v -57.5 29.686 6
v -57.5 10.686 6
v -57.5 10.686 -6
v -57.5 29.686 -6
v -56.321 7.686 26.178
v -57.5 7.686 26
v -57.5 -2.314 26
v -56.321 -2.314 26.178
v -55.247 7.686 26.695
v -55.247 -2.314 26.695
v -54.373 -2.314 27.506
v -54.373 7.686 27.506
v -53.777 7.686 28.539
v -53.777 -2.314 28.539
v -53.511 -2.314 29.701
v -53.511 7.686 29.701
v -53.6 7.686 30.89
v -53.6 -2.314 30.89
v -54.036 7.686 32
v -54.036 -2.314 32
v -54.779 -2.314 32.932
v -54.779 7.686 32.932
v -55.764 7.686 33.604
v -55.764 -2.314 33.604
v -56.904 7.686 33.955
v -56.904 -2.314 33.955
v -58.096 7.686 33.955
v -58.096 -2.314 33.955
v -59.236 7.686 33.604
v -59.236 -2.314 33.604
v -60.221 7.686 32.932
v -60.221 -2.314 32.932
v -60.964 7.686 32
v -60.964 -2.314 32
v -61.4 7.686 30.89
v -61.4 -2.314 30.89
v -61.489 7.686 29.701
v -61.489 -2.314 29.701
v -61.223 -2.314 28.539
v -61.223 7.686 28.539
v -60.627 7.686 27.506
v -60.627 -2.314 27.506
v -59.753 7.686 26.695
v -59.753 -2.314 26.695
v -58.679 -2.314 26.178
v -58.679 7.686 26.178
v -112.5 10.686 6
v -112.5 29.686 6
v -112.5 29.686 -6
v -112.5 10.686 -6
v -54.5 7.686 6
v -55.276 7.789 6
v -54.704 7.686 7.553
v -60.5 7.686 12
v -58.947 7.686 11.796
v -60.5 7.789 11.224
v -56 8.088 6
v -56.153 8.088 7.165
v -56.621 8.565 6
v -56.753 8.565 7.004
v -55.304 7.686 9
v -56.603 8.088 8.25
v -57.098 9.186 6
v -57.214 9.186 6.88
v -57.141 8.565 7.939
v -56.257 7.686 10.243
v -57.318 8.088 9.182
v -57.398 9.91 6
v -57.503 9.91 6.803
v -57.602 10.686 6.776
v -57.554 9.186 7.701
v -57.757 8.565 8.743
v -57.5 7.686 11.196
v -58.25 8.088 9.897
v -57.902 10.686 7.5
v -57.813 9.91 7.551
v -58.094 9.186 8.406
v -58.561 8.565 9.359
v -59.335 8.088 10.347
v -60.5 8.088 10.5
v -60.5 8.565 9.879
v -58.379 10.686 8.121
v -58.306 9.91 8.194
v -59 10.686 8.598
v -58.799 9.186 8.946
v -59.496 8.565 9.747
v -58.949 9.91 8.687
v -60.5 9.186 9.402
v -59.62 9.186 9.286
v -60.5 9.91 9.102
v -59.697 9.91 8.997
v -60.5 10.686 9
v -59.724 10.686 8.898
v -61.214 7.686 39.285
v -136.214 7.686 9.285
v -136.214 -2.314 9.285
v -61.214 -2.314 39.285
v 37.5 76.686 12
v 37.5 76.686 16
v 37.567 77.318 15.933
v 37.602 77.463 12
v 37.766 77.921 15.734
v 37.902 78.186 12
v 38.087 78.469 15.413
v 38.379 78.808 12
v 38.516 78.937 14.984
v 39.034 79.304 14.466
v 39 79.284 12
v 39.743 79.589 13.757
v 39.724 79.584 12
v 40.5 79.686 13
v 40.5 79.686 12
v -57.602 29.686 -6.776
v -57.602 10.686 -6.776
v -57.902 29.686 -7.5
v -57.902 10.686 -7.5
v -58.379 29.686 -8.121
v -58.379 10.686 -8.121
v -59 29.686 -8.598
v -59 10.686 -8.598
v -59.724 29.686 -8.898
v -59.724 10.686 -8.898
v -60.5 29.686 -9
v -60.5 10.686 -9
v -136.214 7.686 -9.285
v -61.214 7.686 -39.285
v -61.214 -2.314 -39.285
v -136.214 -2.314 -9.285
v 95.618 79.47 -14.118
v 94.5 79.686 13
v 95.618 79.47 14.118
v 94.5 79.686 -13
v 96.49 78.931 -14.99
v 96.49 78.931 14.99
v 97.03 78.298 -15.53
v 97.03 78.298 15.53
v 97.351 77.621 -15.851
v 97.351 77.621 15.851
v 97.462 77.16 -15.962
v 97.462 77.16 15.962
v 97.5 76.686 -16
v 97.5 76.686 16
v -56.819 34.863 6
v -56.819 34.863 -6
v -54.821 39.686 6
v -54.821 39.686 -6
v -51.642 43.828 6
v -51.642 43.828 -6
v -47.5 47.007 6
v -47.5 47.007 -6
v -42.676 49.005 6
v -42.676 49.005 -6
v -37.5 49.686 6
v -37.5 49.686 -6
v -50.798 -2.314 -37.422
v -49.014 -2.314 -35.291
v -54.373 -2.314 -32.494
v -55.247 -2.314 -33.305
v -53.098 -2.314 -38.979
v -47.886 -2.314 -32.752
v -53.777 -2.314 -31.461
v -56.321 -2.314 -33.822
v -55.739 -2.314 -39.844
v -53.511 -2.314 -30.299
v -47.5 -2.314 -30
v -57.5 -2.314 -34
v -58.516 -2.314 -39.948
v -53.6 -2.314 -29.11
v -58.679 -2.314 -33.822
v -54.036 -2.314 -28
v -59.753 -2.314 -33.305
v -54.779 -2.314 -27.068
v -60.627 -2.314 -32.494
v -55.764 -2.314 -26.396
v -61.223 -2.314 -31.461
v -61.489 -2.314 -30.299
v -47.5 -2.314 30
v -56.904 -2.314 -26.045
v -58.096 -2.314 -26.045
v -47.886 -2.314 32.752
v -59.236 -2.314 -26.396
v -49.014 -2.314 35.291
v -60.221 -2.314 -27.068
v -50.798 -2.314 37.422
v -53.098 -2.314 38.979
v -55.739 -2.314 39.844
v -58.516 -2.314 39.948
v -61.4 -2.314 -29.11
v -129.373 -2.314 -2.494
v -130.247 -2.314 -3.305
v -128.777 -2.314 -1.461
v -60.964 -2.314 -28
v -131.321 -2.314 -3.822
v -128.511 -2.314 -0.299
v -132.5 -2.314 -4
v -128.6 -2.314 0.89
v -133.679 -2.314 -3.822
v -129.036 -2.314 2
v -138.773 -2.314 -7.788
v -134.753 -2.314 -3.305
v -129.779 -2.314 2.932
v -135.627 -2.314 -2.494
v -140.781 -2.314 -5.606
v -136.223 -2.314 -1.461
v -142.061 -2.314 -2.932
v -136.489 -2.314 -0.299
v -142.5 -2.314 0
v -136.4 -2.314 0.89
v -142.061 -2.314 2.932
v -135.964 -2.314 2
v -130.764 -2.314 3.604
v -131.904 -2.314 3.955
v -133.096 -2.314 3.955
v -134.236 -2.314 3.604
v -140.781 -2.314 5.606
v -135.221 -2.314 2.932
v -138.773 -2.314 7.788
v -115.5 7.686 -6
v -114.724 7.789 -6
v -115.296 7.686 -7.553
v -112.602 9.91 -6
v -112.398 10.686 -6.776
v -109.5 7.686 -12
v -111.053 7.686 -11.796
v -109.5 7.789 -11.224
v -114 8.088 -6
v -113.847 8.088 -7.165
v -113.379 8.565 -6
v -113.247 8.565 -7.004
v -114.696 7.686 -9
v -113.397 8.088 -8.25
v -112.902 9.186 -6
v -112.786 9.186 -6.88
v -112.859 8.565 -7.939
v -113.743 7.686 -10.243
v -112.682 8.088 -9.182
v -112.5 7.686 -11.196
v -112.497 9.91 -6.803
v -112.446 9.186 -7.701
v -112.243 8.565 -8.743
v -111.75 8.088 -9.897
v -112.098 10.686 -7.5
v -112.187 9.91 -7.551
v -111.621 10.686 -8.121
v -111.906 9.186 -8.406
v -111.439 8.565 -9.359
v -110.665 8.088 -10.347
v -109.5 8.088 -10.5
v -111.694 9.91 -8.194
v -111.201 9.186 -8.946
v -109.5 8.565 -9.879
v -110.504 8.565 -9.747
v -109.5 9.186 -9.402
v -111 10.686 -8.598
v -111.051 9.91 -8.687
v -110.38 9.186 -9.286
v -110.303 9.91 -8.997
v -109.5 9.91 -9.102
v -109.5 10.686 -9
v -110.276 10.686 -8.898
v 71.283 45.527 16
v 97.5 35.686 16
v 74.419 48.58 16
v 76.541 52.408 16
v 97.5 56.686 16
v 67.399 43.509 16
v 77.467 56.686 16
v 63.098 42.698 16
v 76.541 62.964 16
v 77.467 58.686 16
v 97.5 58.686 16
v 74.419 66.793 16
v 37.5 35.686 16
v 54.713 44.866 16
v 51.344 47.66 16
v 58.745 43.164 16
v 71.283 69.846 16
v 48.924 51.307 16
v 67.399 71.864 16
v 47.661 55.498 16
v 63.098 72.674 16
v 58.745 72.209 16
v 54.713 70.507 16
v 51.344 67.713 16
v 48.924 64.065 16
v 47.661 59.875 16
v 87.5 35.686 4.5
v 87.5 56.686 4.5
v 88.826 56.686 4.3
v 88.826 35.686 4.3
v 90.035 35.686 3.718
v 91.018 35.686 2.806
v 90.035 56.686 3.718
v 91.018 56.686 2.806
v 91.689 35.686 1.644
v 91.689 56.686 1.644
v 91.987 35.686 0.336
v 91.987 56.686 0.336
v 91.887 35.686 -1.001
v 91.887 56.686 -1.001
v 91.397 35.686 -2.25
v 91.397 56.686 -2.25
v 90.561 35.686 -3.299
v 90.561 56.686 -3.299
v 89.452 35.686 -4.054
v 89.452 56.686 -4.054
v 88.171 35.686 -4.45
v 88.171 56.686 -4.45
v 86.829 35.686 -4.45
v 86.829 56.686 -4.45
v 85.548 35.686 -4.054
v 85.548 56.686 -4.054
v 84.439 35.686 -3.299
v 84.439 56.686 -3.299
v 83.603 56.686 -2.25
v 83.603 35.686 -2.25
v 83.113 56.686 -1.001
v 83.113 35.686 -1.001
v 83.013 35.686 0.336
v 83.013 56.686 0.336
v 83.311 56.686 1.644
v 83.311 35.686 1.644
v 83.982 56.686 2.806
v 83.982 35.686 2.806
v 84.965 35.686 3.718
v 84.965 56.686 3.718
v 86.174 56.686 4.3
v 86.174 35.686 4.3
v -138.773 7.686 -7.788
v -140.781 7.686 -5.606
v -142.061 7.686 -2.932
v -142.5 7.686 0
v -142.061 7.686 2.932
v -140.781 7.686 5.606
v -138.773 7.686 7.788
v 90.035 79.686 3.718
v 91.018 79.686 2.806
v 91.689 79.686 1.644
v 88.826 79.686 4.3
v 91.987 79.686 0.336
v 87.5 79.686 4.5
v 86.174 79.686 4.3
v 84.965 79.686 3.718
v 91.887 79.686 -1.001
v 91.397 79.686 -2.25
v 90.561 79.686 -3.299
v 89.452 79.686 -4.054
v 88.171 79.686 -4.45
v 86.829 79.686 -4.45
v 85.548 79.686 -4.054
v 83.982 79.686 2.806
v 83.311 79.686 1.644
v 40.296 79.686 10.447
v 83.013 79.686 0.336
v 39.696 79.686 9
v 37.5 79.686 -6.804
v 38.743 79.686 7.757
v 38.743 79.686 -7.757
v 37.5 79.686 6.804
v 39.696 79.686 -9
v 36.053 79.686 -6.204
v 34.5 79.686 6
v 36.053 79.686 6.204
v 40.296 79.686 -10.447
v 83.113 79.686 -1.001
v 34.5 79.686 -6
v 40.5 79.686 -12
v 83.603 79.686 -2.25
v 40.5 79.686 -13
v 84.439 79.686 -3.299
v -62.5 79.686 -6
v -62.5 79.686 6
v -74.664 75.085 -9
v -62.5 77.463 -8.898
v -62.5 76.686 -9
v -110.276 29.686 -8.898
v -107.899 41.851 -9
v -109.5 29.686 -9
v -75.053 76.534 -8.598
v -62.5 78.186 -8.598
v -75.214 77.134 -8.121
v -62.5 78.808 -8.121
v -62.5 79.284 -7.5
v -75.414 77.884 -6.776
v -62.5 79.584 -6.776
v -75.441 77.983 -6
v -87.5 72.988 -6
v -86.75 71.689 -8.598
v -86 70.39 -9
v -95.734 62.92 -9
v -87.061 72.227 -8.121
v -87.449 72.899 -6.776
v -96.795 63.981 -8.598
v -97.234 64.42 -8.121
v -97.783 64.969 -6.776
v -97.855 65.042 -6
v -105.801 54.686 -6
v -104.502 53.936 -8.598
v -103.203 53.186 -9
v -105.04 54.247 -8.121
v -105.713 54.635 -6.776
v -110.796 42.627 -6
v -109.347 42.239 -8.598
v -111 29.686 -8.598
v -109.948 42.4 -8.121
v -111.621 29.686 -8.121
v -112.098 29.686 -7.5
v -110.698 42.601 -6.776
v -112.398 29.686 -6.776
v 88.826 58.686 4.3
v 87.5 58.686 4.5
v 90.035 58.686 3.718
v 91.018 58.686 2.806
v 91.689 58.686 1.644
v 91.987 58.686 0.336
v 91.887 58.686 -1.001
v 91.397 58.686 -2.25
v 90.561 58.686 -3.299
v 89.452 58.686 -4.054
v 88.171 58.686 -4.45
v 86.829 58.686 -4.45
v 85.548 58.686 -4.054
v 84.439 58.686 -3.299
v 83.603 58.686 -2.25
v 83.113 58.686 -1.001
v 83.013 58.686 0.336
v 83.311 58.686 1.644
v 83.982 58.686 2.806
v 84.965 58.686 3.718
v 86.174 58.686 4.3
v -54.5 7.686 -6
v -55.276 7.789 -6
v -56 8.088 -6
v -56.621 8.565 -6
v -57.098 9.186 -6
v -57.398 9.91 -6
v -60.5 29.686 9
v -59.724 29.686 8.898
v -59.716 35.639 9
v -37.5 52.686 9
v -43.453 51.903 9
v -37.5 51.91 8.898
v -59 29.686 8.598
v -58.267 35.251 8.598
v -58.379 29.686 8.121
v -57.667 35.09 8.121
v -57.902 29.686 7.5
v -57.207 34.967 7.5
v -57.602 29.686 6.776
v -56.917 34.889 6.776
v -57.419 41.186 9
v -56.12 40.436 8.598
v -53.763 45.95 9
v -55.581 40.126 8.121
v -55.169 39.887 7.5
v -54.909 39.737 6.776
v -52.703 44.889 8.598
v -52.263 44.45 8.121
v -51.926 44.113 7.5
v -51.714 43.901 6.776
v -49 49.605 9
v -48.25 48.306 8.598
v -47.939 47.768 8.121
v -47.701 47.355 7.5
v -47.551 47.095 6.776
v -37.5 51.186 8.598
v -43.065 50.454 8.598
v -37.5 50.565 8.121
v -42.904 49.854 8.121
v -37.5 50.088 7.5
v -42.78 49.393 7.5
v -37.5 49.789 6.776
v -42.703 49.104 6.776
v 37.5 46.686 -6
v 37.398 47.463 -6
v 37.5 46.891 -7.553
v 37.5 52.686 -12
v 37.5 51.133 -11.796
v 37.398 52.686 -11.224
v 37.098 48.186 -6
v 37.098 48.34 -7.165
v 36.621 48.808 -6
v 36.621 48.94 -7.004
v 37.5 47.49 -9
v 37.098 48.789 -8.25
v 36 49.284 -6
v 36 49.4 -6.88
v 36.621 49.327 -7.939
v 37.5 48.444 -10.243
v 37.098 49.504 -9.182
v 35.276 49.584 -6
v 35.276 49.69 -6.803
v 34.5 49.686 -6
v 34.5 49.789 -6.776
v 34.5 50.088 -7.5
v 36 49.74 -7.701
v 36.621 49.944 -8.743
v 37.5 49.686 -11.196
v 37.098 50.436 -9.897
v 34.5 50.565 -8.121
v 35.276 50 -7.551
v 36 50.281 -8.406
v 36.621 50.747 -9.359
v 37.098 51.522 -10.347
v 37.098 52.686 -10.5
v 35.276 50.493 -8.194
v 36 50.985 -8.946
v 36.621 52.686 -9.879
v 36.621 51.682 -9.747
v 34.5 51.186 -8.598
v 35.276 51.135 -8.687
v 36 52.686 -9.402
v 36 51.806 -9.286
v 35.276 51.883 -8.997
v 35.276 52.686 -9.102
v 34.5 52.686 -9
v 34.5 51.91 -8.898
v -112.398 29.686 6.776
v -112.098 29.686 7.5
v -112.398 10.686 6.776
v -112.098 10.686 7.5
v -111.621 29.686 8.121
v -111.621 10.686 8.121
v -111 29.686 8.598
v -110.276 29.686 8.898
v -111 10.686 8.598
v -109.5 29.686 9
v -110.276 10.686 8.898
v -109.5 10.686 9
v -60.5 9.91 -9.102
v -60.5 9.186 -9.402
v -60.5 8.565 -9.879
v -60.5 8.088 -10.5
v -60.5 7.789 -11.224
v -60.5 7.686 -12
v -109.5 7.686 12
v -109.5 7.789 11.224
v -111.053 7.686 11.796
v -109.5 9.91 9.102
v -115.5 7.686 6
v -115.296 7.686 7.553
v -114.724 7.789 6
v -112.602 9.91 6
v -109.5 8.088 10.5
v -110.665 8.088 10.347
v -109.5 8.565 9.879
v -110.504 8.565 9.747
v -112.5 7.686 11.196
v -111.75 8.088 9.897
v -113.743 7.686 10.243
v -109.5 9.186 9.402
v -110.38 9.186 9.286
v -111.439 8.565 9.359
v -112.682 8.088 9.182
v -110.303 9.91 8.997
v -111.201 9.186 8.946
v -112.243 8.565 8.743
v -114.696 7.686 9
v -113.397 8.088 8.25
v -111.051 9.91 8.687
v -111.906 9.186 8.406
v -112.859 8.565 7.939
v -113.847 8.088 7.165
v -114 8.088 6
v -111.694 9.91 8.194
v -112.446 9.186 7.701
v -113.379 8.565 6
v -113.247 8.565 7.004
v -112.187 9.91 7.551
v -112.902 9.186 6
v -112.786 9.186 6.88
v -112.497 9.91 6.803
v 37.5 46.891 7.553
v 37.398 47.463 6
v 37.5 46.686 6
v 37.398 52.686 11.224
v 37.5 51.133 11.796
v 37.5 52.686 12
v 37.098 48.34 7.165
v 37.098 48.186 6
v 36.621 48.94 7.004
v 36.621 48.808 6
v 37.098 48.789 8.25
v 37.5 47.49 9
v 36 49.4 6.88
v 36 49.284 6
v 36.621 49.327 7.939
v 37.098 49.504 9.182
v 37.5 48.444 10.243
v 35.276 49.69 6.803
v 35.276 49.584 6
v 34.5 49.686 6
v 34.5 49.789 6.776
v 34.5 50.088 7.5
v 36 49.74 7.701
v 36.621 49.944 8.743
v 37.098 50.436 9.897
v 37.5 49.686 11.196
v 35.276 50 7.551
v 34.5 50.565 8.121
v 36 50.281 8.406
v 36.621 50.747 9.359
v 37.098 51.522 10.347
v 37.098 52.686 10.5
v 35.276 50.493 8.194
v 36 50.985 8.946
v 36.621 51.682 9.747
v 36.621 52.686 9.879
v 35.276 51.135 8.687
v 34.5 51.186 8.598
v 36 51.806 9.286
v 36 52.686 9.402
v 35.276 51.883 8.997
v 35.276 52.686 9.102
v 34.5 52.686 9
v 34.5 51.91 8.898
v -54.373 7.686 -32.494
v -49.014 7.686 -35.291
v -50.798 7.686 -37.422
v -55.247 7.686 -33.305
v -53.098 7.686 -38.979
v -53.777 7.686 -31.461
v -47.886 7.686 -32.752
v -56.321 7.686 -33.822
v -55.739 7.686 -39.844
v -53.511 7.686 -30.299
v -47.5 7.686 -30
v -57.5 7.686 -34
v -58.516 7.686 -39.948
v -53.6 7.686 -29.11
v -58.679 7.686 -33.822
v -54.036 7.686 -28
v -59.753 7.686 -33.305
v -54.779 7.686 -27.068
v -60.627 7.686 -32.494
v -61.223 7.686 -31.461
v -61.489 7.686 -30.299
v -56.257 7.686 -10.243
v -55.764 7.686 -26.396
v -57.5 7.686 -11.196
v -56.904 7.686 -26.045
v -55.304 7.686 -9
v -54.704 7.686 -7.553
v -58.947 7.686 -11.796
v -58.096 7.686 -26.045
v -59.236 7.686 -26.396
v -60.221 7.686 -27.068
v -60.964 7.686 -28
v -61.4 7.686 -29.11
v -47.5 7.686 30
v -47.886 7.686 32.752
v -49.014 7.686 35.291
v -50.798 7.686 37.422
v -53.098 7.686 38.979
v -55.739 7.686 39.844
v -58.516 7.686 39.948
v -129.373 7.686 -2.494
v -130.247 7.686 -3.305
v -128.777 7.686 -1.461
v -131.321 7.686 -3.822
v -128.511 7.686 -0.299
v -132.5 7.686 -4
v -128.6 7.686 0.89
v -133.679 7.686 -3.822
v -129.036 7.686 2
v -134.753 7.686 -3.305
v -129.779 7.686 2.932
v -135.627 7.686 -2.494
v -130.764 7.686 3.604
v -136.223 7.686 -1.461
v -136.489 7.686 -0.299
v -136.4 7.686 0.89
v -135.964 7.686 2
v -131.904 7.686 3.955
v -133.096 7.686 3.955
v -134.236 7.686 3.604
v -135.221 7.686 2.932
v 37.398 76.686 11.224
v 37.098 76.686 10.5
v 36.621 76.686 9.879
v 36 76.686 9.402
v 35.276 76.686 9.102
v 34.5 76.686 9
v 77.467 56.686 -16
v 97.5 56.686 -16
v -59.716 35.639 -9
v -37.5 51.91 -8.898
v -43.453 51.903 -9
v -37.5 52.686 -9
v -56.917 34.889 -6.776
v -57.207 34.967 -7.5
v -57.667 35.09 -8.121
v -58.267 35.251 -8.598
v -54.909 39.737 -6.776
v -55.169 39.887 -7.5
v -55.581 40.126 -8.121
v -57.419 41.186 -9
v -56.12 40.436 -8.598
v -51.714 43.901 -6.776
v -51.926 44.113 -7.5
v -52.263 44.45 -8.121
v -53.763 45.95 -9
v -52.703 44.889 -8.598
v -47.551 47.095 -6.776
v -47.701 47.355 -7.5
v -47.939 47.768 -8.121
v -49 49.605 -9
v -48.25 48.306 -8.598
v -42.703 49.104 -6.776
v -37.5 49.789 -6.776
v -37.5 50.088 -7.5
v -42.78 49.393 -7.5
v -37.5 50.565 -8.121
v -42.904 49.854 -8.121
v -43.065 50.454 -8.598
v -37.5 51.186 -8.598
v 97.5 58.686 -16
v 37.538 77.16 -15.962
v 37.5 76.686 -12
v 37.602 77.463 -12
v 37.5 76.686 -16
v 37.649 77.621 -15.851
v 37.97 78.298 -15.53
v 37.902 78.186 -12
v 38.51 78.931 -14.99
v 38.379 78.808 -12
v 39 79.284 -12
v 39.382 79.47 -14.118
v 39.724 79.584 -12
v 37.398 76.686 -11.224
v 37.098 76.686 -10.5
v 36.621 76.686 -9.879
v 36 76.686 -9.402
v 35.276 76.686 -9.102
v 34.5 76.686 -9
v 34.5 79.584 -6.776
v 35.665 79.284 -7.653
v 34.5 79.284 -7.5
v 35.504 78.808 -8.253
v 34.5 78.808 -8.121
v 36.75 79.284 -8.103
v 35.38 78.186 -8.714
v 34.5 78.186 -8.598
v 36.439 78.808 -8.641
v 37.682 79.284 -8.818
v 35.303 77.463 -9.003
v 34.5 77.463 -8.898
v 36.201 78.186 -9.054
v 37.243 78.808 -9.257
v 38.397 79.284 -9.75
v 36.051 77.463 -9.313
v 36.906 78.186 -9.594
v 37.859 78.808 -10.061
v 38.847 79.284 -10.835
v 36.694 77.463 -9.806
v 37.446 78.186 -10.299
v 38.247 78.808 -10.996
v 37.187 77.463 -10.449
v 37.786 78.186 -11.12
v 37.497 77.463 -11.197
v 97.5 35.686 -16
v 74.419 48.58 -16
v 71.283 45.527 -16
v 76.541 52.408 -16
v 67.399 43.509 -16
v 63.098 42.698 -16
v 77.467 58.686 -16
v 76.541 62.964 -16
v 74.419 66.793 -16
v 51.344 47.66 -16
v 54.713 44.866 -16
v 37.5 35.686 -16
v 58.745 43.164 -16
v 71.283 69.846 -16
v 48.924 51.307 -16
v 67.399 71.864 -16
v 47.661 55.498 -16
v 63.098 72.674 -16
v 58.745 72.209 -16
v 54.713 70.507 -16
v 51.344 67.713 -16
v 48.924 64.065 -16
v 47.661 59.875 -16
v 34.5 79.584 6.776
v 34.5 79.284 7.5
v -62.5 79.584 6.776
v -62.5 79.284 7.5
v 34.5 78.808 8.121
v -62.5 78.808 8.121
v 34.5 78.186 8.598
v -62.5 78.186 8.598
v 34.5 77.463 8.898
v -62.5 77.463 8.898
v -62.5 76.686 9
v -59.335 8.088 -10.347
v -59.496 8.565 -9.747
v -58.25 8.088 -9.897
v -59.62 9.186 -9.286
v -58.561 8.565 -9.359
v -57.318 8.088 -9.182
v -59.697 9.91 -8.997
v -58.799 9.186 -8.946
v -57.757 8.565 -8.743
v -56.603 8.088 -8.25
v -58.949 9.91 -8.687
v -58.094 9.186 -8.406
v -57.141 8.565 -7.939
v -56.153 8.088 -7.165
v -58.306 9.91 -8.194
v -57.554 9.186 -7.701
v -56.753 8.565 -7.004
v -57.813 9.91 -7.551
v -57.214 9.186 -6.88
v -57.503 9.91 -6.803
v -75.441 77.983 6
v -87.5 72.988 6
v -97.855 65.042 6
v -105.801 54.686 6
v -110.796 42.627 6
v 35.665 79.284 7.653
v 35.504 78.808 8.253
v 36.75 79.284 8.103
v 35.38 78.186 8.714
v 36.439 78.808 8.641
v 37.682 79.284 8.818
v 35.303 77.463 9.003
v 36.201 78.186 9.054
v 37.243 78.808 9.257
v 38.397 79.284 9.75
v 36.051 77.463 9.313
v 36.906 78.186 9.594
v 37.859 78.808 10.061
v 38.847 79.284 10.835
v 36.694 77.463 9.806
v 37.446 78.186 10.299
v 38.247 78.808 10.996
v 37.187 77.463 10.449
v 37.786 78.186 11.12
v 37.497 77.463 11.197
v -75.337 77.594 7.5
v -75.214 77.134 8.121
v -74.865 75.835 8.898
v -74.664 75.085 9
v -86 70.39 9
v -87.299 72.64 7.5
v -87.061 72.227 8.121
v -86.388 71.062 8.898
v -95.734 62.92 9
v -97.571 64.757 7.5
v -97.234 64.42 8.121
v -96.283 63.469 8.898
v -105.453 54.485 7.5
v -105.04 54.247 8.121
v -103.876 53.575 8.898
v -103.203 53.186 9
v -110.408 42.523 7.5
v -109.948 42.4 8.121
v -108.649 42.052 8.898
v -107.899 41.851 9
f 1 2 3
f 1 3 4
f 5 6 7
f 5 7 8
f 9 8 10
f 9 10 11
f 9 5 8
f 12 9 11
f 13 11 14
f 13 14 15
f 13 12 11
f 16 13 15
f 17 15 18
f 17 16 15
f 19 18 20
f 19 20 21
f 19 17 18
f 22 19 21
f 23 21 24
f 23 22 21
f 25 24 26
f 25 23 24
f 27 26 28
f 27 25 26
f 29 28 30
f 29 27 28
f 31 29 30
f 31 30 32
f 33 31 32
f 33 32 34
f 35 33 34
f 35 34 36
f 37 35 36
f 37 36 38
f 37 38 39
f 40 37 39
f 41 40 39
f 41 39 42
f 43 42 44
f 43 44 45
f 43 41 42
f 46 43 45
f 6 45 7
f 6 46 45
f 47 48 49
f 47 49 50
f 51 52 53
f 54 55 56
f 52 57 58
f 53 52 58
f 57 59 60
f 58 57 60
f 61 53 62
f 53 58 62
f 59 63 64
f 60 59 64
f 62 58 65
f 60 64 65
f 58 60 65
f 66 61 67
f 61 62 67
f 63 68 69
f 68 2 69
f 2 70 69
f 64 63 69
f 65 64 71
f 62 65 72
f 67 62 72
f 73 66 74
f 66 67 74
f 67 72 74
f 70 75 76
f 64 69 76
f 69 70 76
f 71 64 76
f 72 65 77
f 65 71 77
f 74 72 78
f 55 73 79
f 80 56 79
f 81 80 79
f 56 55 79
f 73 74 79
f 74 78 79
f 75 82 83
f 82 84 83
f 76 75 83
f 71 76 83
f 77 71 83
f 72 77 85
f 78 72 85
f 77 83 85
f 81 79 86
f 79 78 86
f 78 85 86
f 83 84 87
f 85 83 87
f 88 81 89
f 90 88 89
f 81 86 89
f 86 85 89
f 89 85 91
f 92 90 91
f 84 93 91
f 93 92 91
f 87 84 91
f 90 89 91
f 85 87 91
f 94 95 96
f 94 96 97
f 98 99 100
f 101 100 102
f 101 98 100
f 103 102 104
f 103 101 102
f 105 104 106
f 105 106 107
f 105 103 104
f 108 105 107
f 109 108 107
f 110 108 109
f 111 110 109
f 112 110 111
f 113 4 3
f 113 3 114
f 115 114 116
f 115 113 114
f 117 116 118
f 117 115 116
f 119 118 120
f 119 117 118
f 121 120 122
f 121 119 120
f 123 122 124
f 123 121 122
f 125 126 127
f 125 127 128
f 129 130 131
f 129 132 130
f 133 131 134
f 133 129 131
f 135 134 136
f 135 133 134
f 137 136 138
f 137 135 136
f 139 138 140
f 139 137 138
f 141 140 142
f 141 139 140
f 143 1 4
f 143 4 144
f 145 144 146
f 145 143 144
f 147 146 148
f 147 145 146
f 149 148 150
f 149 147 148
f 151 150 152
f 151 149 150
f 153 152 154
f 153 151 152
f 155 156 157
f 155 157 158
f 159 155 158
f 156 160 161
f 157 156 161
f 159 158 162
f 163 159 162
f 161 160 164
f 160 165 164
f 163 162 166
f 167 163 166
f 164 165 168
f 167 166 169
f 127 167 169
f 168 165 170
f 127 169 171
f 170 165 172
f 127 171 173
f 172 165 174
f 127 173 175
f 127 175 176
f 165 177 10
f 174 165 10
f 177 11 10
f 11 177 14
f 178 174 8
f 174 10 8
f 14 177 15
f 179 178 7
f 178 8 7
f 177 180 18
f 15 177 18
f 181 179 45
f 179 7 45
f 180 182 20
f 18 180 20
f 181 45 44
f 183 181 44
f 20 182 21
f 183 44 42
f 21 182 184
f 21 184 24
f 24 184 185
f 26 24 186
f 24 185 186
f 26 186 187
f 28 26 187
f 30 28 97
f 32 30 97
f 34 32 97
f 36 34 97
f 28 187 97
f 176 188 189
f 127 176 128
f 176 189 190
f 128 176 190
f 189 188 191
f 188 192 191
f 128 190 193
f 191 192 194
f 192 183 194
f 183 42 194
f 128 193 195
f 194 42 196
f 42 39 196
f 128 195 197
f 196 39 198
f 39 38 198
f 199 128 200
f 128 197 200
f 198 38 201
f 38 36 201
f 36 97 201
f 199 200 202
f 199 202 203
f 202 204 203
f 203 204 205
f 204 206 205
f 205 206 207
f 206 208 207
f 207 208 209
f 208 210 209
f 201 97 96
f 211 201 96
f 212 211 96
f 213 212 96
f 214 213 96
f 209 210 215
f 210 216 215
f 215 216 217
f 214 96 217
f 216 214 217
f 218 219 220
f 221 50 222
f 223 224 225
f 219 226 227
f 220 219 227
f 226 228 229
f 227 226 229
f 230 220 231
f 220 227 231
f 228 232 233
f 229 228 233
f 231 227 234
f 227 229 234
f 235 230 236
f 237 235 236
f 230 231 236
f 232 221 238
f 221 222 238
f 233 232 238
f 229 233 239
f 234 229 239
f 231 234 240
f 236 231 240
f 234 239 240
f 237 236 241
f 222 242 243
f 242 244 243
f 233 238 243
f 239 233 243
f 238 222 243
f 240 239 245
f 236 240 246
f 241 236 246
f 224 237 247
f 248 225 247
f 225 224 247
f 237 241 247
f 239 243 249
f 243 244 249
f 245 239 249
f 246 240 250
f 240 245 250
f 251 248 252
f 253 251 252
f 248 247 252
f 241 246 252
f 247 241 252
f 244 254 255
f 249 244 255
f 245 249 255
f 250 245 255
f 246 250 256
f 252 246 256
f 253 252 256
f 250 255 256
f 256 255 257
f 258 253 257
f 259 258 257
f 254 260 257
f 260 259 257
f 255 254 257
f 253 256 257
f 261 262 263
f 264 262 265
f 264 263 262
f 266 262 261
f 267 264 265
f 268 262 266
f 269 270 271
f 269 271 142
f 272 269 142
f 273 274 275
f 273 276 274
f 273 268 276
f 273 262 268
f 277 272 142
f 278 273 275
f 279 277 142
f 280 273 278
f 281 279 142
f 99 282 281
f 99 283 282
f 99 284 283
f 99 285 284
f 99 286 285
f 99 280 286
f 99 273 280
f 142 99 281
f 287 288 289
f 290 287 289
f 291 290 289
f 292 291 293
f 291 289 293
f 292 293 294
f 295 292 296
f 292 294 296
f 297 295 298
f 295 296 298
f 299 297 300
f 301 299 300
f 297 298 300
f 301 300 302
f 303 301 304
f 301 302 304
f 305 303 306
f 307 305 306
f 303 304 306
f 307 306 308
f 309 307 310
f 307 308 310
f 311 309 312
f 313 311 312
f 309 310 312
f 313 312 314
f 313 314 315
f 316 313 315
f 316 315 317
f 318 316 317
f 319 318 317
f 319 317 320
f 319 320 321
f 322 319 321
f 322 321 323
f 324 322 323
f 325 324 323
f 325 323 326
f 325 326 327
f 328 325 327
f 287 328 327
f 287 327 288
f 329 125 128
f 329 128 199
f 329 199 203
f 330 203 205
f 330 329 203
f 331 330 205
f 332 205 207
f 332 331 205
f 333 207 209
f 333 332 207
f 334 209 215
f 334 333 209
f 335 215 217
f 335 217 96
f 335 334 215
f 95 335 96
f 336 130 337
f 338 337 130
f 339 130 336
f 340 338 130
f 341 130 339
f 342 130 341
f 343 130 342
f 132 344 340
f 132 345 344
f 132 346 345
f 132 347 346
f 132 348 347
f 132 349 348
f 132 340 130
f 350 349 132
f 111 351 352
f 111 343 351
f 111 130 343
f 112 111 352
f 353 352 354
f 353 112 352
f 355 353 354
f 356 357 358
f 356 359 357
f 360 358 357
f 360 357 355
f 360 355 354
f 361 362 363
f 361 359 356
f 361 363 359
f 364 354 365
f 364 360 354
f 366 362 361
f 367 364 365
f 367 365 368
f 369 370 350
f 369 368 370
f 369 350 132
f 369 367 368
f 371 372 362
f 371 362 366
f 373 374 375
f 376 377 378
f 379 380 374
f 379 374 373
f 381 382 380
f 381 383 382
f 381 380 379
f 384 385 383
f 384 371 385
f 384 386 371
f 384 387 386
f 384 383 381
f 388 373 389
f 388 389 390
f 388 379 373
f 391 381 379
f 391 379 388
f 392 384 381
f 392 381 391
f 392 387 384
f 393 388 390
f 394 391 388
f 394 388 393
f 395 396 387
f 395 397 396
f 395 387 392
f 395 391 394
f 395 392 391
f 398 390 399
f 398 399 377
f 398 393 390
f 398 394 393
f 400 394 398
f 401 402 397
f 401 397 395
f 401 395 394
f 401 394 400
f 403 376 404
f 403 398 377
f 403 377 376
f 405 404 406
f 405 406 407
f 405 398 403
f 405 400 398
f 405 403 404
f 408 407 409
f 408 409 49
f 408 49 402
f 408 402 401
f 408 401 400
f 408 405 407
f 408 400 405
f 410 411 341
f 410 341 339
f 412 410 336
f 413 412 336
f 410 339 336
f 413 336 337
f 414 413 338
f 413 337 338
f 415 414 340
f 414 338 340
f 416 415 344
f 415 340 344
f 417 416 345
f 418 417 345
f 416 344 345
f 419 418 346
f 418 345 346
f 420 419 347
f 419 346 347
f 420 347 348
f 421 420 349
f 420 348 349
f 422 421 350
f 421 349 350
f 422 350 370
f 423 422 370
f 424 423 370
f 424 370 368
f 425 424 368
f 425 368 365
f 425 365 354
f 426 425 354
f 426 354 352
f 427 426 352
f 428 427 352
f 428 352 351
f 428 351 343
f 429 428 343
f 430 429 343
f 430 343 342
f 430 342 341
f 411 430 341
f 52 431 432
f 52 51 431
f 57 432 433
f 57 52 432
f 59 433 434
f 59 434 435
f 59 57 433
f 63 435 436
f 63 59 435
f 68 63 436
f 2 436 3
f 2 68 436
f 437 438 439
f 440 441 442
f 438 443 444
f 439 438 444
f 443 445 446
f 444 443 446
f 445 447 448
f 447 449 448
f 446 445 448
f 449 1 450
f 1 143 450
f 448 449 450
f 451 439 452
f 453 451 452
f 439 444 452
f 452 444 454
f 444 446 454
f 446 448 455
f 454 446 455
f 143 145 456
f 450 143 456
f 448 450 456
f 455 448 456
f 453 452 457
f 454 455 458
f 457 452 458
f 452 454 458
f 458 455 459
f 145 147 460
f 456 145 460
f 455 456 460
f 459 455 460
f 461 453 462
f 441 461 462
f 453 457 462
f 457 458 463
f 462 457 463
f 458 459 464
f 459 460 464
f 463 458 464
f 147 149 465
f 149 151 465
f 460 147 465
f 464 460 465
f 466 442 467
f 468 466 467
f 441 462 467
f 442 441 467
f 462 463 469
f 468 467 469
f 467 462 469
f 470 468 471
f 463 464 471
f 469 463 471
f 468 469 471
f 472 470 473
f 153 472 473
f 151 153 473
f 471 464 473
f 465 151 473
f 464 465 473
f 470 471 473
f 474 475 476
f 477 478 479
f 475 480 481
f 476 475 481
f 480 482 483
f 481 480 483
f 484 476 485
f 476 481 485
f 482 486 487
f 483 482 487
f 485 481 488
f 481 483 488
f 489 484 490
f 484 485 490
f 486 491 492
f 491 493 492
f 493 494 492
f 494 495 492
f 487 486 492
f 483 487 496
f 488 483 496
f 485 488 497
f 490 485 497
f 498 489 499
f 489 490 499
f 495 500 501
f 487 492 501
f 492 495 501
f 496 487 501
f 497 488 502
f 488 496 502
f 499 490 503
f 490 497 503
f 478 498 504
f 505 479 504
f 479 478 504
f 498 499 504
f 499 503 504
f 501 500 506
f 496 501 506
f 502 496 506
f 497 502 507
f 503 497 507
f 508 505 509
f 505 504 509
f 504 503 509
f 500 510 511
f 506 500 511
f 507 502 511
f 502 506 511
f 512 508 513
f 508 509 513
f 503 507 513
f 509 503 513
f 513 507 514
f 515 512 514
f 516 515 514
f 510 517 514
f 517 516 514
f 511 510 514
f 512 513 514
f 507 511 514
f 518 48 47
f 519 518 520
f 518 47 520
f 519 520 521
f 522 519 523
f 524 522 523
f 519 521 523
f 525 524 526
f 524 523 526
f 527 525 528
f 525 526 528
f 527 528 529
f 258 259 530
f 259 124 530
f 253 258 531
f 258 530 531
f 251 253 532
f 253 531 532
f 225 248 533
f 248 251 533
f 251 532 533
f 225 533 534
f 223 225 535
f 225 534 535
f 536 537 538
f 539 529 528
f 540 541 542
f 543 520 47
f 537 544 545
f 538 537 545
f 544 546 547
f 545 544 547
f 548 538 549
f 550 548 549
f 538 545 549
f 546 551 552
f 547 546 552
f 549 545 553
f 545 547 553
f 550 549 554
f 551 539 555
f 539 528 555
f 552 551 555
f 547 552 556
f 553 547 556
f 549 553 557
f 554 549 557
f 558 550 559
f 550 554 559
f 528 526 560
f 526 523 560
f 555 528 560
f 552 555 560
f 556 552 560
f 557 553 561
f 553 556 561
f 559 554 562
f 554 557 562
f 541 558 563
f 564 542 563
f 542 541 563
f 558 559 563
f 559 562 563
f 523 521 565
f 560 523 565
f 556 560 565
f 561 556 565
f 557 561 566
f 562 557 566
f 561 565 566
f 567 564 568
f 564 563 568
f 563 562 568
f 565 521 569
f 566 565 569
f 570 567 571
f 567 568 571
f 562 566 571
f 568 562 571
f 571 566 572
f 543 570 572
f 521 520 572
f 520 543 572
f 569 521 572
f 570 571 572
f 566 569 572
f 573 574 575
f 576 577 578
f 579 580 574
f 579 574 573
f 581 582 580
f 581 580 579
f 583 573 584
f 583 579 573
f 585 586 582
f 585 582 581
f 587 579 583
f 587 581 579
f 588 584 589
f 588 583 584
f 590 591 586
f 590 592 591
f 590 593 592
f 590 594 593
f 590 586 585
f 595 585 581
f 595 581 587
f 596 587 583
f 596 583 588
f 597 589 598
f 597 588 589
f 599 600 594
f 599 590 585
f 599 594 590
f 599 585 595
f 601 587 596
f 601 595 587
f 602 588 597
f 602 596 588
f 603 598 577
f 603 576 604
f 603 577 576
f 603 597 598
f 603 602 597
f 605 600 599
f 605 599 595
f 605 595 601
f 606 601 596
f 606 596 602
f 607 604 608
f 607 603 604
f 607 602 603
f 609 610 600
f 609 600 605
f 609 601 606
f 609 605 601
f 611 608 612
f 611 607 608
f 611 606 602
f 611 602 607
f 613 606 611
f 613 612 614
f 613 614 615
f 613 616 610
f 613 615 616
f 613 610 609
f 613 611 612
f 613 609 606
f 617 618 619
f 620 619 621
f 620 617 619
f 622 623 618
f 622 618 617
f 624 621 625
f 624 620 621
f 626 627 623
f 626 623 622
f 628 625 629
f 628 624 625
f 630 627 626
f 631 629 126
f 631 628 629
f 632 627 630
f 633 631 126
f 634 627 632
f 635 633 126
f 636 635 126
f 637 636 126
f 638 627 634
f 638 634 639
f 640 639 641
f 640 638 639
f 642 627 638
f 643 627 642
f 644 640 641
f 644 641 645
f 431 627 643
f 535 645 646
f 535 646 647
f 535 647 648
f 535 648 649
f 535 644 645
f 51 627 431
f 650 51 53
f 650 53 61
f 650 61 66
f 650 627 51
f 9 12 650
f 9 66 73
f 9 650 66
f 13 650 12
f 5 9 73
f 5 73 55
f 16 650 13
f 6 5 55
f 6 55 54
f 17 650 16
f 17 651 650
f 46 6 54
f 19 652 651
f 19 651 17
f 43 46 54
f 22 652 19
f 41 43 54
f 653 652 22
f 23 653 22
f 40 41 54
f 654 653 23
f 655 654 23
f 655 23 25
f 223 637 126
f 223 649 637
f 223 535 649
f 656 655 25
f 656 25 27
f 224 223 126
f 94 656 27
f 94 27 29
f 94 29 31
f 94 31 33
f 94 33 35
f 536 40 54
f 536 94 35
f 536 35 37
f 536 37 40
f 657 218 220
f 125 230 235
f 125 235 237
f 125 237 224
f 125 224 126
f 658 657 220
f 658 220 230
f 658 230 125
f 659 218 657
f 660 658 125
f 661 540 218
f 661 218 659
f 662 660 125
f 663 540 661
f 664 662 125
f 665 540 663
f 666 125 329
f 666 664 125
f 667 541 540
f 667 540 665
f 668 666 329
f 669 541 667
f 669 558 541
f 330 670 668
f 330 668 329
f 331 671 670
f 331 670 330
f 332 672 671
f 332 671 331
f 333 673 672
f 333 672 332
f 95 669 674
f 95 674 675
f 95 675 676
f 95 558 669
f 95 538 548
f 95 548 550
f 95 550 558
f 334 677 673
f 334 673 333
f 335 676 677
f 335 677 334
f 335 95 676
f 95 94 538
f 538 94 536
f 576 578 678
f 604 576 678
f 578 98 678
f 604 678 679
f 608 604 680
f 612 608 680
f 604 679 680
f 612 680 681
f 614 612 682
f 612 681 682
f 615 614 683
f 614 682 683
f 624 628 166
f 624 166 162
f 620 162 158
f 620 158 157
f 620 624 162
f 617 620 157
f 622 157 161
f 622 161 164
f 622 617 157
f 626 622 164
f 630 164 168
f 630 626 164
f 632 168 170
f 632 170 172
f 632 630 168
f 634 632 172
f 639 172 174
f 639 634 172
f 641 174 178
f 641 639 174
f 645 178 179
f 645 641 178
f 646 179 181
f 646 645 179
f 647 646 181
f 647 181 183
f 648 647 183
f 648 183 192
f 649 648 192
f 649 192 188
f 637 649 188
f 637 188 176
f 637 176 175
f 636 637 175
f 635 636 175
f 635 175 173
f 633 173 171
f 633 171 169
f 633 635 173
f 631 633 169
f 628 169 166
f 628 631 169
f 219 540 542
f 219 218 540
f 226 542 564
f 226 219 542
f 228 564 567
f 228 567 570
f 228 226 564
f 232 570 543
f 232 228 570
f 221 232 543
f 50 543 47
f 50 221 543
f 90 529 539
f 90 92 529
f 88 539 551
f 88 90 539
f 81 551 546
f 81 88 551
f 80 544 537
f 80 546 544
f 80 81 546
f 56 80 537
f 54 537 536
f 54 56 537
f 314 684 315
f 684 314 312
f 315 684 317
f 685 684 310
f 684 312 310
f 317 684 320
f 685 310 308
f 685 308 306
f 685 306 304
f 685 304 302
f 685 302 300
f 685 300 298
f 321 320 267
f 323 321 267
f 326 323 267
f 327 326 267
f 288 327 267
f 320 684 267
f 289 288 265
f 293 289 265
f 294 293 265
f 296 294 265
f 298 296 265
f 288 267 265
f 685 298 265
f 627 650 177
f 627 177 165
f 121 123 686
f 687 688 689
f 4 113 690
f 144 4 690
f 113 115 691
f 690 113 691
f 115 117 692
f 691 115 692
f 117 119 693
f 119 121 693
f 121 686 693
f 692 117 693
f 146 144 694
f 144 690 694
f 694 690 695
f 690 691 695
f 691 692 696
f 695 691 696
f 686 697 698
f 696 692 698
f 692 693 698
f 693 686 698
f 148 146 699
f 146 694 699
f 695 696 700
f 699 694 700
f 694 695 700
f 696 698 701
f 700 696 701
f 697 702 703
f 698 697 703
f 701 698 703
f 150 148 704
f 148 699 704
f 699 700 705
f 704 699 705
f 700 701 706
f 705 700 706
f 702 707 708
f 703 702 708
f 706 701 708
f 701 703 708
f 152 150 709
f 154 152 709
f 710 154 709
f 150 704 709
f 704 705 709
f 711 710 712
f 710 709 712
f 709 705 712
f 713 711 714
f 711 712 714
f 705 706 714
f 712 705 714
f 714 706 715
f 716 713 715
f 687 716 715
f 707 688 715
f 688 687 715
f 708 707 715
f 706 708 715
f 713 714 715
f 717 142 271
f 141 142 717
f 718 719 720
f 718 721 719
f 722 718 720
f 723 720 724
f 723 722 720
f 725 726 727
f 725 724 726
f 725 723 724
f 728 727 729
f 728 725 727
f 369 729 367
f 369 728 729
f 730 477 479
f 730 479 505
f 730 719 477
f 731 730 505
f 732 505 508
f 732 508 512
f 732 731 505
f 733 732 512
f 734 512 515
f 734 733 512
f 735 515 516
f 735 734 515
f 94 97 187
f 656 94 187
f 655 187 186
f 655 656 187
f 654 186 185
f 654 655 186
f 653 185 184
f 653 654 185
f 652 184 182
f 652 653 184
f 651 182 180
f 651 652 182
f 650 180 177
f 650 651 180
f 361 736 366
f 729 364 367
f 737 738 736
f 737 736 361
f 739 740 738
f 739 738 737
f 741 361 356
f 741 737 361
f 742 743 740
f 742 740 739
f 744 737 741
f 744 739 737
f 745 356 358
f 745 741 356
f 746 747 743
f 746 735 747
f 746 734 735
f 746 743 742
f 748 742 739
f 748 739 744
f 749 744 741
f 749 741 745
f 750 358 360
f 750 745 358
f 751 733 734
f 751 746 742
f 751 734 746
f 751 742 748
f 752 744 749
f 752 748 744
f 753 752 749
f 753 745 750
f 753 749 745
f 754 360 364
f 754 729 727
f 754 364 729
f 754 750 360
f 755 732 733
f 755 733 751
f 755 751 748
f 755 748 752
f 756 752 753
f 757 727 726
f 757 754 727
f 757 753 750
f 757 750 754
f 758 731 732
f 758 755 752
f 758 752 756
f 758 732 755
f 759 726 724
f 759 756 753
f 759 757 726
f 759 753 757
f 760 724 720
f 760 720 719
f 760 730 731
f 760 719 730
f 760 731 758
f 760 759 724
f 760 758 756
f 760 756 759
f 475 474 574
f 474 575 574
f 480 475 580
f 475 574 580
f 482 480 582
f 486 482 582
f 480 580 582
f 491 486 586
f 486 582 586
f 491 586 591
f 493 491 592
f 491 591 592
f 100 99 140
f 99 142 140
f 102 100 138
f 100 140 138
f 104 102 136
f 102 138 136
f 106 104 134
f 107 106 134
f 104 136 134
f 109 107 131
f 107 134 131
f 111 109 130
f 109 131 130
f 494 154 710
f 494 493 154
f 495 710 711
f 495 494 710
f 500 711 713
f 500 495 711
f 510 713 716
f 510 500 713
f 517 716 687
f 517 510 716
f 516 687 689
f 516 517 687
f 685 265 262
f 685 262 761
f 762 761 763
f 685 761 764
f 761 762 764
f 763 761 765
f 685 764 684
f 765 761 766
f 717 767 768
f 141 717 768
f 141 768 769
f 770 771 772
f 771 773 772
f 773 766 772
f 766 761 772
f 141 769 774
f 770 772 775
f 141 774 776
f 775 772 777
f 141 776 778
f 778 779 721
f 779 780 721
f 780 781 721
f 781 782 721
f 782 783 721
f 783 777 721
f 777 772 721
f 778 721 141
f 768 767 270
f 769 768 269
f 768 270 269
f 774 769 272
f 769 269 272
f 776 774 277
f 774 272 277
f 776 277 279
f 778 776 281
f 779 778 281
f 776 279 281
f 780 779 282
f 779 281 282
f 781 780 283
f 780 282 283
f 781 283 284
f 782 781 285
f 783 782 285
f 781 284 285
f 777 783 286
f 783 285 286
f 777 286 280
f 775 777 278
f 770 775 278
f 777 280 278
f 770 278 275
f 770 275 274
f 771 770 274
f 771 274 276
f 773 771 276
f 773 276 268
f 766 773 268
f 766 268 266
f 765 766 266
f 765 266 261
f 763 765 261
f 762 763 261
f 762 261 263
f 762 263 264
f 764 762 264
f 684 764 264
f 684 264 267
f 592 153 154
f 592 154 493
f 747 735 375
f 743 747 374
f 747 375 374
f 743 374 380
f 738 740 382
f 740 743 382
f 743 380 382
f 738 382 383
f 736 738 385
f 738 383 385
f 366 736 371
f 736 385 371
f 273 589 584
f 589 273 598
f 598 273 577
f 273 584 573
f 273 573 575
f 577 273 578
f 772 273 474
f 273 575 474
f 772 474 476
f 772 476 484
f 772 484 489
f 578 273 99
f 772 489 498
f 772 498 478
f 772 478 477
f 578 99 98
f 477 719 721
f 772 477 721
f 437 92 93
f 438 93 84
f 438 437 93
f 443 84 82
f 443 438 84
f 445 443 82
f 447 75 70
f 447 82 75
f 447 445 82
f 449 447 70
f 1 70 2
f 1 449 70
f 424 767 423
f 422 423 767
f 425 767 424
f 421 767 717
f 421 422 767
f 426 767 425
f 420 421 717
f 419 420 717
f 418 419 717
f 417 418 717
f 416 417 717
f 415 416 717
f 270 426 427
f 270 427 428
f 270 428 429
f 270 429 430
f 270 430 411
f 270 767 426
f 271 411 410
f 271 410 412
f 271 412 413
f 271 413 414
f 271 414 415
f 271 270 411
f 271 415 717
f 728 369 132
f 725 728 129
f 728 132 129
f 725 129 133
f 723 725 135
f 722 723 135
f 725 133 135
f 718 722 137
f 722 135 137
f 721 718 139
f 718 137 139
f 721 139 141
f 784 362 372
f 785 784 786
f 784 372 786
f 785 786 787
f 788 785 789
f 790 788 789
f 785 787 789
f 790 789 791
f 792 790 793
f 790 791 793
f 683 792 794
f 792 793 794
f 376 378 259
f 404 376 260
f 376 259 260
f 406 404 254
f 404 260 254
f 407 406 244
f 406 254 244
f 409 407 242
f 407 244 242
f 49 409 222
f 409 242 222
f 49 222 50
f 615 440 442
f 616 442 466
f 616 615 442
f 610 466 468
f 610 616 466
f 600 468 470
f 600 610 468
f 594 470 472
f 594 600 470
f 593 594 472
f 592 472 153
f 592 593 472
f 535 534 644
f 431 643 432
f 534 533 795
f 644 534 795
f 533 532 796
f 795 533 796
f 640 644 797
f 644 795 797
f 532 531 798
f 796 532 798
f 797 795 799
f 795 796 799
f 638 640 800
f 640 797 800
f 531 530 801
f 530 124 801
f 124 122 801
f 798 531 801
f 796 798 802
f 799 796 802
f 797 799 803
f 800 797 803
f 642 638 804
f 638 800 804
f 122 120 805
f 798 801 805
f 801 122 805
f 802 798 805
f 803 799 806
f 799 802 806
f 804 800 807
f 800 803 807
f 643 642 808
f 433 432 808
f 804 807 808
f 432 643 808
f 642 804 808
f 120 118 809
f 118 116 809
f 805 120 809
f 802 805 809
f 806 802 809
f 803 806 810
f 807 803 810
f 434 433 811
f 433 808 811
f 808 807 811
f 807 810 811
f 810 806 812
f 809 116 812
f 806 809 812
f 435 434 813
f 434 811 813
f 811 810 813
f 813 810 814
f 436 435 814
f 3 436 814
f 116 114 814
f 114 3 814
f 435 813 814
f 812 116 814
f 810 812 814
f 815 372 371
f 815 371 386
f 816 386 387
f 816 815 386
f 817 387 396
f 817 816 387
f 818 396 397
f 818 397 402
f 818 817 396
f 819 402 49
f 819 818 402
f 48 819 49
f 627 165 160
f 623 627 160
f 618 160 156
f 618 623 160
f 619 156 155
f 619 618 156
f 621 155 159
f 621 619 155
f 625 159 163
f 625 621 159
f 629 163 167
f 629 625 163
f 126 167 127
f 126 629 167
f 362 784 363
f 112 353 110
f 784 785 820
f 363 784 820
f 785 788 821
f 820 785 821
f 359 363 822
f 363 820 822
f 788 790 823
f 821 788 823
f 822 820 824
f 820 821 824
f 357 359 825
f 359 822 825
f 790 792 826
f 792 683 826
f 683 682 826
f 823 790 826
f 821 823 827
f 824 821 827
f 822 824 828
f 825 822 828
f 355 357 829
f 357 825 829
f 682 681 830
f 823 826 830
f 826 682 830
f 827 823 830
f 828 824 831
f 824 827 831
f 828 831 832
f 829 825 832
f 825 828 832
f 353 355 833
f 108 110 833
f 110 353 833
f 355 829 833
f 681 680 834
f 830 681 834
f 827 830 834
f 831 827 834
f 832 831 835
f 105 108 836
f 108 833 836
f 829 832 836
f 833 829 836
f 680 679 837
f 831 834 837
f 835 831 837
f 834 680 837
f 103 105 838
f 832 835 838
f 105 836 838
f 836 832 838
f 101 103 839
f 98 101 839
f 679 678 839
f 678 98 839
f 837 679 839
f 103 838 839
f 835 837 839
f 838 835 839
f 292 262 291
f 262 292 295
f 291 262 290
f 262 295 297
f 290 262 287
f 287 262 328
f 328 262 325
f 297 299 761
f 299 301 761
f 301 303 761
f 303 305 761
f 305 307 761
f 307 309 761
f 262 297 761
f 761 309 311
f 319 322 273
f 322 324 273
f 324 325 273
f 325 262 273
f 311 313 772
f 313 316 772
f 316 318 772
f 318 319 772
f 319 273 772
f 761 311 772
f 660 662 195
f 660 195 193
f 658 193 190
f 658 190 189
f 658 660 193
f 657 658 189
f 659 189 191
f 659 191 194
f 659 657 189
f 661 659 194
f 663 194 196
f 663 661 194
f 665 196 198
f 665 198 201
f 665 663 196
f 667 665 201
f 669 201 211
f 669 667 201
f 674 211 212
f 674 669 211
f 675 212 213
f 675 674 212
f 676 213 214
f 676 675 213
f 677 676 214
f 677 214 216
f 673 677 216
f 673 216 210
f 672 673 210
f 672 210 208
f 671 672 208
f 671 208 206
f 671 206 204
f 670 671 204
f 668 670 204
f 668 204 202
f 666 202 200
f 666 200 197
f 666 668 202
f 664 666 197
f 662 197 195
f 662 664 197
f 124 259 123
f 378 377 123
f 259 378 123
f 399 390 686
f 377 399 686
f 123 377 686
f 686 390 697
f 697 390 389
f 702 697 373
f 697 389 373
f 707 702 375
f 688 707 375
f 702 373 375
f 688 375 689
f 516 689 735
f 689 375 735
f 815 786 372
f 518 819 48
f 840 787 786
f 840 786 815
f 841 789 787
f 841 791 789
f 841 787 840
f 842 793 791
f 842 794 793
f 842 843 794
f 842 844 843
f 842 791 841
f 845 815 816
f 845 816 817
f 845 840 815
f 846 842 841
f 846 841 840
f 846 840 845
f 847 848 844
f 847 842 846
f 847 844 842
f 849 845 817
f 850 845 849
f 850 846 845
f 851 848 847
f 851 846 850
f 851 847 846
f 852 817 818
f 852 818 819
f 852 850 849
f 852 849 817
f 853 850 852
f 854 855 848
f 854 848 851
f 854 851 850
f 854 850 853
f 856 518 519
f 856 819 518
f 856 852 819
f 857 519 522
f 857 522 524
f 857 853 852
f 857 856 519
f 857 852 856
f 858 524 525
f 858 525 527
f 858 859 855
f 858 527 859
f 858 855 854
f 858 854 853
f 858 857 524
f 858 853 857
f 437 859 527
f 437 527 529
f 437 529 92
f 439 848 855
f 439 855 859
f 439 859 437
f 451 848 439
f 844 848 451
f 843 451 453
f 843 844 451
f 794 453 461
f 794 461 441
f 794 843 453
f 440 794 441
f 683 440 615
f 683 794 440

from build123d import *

# Parameters (mm, degrees)
BOSS_EXTRUDE1_DEPTH = 9
SKETCH3_R           = 4
SKETCH3_W           = 55
SKETCH3_H           = 18
BOSS_EXTRUDE2_DEPTH = 10
SKETCH4_W           = 32
SKETCH4_H           = 44
BOSS_EXTRUDE3_DEPTH = 60
SKETCH5_R           = 15
CUT_EXTRUDE1_DEPTH  = 60
SKETCH6_W           = 54.078900839
SKETCH6_H           = 2
CUT_EXTRUDE2_DEPTH  = 60
SKETCH7_R           = 4.5
CUT_EXTRUDE3_DEPTH  = 170.204757616
FILLET1_R           = 3


with BuildPart() as part:
    # Sketch1 → Boss-Extrude1 (new, symmetric)
    with BuildSketch(Plane.XY):
        with BuildLine():
            Line((-112.5, 7.686316473), (-57.5, 7.686316473))
            Line((-57.5, 7.686316473), (-57.5, 29.686316473))
            ThreePointArc((-57.5, 29.686316473), (-51.642135624, 43.828452097), (-37.5, 49.686316473))
            Line((-37.5, 49.686316473), (37.5, 49.686316473))
            Line((37.5, 49.686316473), (37.5, 79.686316473))
            Line((37.5, 79.686316473), (-62.5, 79.686316473))
            ThreePointArc((-62.5, 79.686316473), (-97.855339059, 65.041655533), (-112.5, 29.686316473))
            Line((-112.5, 29.686316473), (-112.5, 7.686316473))
        make_face()
    extrude(amount=BOSS_EXTRUDE1_DEPTH, both=True)

    # Sketch3 → Boss-Extrude2 (add)
    # profile 1 of 2: a face of its own
    with BuildSketch(Plane.XZ.offset(-7.686316473)):
        with BuildLine():
            ThreePointArc((-136.213906764, -9.284766909), (-142.5, 0), (-136.213906764, 9.284766909))
            Line((-136.213906764, 9.284766909), (-61.213906764, 39.284766909))
            ThreePointArc((-61.213906764, 39.284766909), (-51.893711907, 38.280672305), (-47.5, 30))
            Line((-47.5, 30), (-47.5, -30))
            ThreePointArc((-47.5, -30), (-51.893711907, -38.280672305), (-61.213906764, -39.284766909))
            Line((-61.213906764, -39.284766909), (-136.213906764, -9.284766909))
        make_face()
        with Locations(Location((-57.5, 30, 0), (0, 0, 270))):
            Circle(SKETCH3_R, mode=Mode.SUBTRACT)
        with Locations(Location((-57.5, -30, 0), (0, 0, 270))):
            Circle(SKETCH3_R, mode=Mode.SUBTRACT)
        with Locations(Location((-132.5, 0, 0), (0, 0, 270))):
            Circle(SKETCH3_R, mode=Mode.SUBTRACT)
        with Locations((-85, 0)):
            Rectangle(SKETCH3_W, SKETCH3_H, mode=Mode.SUBTRACT)
    # profile 2 of 2: a face of its own
    with BuildSketch(Plane.XZ.offset(-7.686316473)):
        with Locations((-85, 0)):
            Rectangle(SKETCH3_W, SKETCH3_H)
    extrude(amount=BOSS_EXTRUDE2_DEPTH)

    # Sketch4 → Boss-Extrude3 (add)
    with BuildSketch(Plane(origin=(37.5, 0, 0), x_dir=(0, 0, -1), z_dir=(1, 0, 0))):
        with Locations((0, 57.686316473)):
            Rectangle(SKETCH4_W, SKETCH4_H)
    extrude(amount=BOSS_EXTRUDE3_DEPTH)

    # Sketch5 → Cut-Extrude1 (cut)
    with BuildSketch(Plane.XY.offset(16)):
        with Locations((62.5, 57.686316473)):
            Circle(SKETCH5_R)
    extrude(amount=-CUT_EXTRUDE1_DEPTH, mode=Mode.SUBTRACT)

    # Sketch6 → Cut-Extrude2 (cut)
    with BuildSketch(Plane.XY.offset(16)):
        with Locations((94.351130384, 57.686316473)):
            Rectangle(SKETCH6_W, SKETCH6_H)
    extrude(amount=-CUT_EXTRUDE2_DEPTH, mode=Mode.SUBTRACT)

    # Sketch7 → Cut-Extrude3 (cut, through all)
    with BuildSketch(Plane(origin=(0, 79.686316473, 0), x_dir=(1, 0, 0), z_dir=(0, 1, 0))):
        with Locations(Location((87.5, 0, 0), (0, 0, 270))):
            Circle(SKETCH7_R)
    extrude(amount=-CUT_EXTRUDE3_DEPTH, mode=Mode.SUBTRACT)

    # Fillet1
    fillet1_edges = [part.edges().sort_by_distance(p)[0] for p in [
        (-57.5, 18.686316473, 9),
        (-85, 7.686316473, -9),
        (-112.5, 18.686316473, -9),
        (-51.642135624, 43.828452097, 9),
        (37.5, 49.686316473, 0),
        (-57.5, 7.686316473, 0),
        (-112.5, 7.686316473, 0),
        (0, 49.686316473, 9),
        (37.5, 64.686316473, 9),
        (-12.5, 79.686316473, 9),
        (-97.855339059, 65.041655533, 9),
        (-112.5, 18.686316473, 9),
        (97.5, 79.686316473, 0),
        (67.5, 79.686316473, -16),
        (67.5, 79.686316473, 16),
        (37.5, 79.686316473, -12.5),
        (37.5, 79.686316473, 12.5),
        (-85, 7.686316473, 9),
        (-97.855339059, 65.041655533, -9),
        (-12.5, 79.686316473, -9),
        (37.5, 64.686316473, -9),
        (0, 49.686316473, -9),
        (-51.642135624, 43.828452097, -9),
        (-57.5, 18.686316473, -9),
    ]]
    fillet(fillet1_edges, radius=FILLET1_R)


solid = part.part
